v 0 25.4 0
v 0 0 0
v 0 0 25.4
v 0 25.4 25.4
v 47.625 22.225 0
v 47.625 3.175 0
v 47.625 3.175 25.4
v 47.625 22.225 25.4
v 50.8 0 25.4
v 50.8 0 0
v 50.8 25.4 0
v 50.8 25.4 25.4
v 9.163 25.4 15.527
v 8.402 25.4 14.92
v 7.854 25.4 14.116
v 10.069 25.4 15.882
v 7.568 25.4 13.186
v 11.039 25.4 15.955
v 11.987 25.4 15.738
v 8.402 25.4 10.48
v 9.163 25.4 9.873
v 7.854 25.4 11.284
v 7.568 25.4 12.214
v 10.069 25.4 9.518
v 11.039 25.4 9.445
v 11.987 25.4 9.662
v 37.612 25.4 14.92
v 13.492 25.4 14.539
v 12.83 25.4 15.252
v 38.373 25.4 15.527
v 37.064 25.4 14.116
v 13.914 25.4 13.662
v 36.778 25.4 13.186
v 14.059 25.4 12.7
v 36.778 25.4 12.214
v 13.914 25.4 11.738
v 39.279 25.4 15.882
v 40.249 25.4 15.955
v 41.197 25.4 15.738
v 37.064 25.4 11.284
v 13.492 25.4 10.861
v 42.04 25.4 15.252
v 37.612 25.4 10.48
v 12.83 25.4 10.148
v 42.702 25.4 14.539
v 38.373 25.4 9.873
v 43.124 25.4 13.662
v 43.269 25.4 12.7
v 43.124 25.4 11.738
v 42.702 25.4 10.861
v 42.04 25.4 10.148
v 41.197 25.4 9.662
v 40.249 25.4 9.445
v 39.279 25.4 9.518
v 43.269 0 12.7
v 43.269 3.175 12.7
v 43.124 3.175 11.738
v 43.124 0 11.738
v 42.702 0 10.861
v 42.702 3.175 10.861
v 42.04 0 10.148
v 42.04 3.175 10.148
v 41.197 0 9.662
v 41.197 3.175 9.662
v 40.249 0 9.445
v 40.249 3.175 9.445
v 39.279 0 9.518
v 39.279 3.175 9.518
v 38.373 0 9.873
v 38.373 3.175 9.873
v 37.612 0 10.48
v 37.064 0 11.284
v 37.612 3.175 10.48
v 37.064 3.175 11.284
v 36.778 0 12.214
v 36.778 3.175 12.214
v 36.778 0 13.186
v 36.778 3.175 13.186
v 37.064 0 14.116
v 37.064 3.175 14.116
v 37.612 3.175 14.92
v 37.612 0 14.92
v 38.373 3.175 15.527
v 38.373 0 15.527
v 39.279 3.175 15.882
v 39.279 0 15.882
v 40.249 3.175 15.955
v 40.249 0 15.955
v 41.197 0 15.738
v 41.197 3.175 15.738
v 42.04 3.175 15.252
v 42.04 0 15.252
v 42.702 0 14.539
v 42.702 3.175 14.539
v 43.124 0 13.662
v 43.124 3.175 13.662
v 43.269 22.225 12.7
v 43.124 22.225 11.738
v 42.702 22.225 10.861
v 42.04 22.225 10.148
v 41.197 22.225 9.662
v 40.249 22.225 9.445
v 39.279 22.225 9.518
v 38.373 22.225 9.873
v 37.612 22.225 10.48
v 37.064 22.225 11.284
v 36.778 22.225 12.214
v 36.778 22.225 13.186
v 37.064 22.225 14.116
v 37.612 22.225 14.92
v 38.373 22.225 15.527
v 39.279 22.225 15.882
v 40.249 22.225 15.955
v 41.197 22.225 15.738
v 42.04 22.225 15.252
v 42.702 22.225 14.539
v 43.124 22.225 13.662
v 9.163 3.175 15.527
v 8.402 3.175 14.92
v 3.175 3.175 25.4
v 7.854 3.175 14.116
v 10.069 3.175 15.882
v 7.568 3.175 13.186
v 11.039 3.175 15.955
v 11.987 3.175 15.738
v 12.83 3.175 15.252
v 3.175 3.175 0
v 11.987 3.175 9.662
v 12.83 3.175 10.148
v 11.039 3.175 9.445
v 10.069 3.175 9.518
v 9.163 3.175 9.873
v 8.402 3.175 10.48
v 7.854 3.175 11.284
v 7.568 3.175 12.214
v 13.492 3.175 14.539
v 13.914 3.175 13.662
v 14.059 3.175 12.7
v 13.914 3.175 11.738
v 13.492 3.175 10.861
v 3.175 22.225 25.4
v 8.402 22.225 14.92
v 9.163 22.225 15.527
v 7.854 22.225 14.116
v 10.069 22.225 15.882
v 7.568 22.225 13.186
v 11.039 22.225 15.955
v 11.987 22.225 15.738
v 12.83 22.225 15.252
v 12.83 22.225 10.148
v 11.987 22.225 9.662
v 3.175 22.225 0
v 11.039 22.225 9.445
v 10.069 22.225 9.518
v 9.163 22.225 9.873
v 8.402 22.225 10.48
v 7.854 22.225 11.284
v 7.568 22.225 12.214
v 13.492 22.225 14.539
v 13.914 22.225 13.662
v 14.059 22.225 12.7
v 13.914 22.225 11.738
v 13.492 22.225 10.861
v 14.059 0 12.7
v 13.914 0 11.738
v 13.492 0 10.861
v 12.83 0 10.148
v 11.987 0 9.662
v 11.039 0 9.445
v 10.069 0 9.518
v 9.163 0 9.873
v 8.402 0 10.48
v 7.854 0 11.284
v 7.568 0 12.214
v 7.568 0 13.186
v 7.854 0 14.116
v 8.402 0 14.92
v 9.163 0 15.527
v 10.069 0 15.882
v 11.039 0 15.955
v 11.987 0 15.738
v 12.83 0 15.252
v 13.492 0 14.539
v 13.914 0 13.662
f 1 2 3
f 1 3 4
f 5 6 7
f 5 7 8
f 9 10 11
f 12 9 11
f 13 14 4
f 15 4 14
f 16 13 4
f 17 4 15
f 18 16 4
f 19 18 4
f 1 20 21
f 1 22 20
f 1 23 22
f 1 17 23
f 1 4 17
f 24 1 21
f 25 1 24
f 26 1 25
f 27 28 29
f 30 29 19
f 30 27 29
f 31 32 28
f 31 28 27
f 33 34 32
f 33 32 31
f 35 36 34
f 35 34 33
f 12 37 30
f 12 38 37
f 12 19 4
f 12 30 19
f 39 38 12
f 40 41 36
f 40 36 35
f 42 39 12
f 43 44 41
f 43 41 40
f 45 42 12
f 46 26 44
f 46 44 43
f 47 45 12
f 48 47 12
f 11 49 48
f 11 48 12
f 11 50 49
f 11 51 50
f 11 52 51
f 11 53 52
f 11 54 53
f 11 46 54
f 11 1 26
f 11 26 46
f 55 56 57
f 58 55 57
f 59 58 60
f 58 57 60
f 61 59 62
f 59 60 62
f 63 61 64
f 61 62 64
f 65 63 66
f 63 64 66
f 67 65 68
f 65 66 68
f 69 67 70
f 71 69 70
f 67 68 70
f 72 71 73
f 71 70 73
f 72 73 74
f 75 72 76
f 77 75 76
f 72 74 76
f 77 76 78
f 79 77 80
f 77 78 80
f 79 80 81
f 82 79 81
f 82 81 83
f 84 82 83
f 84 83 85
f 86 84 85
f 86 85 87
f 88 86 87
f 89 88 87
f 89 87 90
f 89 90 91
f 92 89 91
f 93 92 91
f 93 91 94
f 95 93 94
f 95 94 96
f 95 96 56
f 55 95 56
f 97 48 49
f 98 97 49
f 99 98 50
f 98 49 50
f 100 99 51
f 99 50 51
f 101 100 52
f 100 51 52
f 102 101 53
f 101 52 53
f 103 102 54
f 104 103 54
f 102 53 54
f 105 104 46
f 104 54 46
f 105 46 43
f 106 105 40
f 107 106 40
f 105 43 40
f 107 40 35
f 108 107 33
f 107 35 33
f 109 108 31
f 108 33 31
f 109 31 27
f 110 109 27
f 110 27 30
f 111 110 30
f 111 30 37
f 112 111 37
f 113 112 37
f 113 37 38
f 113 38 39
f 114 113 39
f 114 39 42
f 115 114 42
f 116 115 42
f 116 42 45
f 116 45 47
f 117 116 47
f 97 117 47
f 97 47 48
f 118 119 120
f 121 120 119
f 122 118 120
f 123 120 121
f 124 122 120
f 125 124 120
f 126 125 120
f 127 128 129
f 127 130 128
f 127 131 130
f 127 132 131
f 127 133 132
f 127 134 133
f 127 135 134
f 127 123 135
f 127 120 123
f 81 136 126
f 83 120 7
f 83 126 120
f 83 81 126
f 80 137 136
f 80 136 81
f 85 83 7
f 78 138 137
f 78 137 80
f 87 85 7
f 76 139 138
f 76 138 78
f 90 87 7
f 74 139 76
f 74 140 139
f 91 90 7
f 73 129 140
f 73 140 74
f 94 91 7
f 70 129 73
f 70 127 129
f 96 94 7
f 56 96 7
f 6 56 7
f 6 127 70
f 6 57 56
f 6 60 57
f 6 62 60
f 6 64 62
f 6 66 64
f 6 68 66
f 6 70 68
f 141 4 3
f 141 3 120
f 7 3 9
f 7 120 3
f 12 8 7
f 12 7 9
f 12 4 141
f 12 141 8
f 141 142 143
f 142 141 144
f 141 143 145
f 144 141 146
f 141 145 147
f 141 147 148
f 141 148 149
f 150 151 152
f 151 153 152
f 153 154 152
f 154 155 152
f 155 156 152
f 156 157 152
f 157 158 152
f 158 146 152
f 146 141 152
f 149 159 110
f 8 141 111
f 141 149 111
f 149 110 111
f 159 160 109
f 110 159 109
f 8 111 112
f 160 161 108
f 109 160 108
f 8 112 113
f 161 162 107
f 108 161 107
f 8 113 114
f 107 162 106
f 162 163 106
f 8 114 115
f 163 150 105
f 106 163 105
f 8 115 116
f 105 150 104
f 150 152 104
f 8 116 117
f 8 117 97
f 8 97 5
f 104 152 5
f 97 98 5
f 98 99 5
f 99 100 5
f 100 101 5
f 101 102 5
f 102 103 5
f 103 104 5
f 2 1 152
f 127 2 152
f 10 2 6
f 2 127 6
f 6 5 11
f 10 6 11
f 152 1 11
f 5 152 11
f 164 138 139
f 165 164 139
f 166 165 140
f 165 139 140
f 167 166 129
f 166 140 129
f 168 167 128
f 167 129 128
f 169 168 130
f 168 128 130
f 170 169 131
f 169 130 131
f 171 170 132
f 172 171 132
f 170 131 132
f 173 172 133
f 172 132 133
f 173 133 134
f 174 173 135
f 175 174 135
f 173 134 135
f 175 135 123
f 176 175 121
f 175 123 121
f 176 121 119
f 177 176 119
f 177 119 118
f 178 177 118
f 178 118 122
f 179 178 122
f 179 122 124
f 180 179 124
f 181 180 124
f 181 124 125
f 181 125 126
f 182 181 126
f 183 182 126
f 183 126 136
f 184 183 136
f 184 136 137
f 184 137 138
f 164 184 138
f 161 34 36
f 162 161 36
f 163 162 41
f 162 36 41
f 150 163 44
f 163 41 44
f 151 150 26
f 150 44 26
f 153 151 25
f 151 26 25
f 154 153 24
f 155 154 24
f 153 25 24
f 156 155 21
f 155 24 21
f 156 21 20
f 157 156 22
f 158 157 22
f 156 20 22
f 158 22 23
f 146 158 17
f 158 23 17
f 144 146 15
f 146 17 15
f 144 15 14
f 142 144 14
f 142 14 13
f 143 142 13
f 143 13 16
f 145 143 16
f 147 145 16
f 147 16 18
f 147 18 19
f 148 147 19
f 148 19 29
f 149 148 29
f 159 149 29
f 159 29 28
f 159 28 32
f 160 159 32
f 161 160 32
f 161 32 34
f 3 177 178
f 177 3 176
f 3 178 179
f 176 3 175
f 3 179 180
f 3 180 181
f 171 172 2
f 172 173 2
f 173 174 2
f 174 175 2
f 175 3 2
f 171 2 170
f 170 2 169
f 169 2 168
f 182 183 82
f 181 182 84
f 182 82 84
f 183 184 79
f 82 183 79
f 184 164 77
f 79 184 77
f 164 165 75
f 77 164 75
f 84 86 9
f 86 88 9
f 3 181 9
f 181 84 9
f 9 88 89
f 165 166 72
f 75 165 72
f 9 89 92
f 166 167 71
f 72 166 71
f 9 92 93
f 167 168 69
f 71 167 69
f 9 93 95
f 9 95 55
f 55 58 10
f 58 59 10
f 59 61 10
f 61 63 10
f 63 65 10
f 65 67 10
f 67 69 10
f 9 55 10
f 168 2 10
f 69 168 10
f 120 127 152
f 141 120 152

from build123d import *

# Parameters (mm, degrees)
SKETCH1_W               = 50.8
SKETCH1_H               = 25.4
SKETCH1_W_2             = 44.45
SKETCH1_H_2             = 19.05
BOSS_EXTRUDE1_DEPTH     = 25.4
SKETCH8_R               = 3.2639
CUT_EXTRUDE1_DEPTH      = 1
CUT_EXTRUDE1_DEPTH_BACK = 26.4


with BuildPart() as part:
    # Sketch1 → Boss-Extrude1 (new body)
    with BuildSketch(Plane.XY):
        with Locations((25.4, 12.7)):
            Rectangle(SKETCH1_W, SKETCH1_H)
        with Locations((25.4, 12.7)):
            Rectangle(SKETCH1_W_2, SKETCH1_H_2, mode=Mode.SUBTRACT)
    extrude(amount=BOSS_EXTRUDE1_DEPTH)

    # Sketch8 → Cut-Extrude1 (cut, two sides)
    with BuildSketch(Plane(origin=(0, 25.4, 0), x_dir=(1, 0, 0), z_dir=(0, 1, 0))) as cut_extrude1_sk:
        with Locations((10.795, -12.7)):
            Circle(SKETCH8_R)
        with Locations((40.005, -12.7)):
            Circle(SKETCH8_R)
    extrude(amount=CUT_EXTRUDE1_DEPTH, mode=Mode.SUBTRACT)
    extrude(cut_extrude1_sk.sketch, amount=-CUT_EXTRUDE1_DEPTH_BACK, mode=Mode.SUBTRACT)


solid = part.part
